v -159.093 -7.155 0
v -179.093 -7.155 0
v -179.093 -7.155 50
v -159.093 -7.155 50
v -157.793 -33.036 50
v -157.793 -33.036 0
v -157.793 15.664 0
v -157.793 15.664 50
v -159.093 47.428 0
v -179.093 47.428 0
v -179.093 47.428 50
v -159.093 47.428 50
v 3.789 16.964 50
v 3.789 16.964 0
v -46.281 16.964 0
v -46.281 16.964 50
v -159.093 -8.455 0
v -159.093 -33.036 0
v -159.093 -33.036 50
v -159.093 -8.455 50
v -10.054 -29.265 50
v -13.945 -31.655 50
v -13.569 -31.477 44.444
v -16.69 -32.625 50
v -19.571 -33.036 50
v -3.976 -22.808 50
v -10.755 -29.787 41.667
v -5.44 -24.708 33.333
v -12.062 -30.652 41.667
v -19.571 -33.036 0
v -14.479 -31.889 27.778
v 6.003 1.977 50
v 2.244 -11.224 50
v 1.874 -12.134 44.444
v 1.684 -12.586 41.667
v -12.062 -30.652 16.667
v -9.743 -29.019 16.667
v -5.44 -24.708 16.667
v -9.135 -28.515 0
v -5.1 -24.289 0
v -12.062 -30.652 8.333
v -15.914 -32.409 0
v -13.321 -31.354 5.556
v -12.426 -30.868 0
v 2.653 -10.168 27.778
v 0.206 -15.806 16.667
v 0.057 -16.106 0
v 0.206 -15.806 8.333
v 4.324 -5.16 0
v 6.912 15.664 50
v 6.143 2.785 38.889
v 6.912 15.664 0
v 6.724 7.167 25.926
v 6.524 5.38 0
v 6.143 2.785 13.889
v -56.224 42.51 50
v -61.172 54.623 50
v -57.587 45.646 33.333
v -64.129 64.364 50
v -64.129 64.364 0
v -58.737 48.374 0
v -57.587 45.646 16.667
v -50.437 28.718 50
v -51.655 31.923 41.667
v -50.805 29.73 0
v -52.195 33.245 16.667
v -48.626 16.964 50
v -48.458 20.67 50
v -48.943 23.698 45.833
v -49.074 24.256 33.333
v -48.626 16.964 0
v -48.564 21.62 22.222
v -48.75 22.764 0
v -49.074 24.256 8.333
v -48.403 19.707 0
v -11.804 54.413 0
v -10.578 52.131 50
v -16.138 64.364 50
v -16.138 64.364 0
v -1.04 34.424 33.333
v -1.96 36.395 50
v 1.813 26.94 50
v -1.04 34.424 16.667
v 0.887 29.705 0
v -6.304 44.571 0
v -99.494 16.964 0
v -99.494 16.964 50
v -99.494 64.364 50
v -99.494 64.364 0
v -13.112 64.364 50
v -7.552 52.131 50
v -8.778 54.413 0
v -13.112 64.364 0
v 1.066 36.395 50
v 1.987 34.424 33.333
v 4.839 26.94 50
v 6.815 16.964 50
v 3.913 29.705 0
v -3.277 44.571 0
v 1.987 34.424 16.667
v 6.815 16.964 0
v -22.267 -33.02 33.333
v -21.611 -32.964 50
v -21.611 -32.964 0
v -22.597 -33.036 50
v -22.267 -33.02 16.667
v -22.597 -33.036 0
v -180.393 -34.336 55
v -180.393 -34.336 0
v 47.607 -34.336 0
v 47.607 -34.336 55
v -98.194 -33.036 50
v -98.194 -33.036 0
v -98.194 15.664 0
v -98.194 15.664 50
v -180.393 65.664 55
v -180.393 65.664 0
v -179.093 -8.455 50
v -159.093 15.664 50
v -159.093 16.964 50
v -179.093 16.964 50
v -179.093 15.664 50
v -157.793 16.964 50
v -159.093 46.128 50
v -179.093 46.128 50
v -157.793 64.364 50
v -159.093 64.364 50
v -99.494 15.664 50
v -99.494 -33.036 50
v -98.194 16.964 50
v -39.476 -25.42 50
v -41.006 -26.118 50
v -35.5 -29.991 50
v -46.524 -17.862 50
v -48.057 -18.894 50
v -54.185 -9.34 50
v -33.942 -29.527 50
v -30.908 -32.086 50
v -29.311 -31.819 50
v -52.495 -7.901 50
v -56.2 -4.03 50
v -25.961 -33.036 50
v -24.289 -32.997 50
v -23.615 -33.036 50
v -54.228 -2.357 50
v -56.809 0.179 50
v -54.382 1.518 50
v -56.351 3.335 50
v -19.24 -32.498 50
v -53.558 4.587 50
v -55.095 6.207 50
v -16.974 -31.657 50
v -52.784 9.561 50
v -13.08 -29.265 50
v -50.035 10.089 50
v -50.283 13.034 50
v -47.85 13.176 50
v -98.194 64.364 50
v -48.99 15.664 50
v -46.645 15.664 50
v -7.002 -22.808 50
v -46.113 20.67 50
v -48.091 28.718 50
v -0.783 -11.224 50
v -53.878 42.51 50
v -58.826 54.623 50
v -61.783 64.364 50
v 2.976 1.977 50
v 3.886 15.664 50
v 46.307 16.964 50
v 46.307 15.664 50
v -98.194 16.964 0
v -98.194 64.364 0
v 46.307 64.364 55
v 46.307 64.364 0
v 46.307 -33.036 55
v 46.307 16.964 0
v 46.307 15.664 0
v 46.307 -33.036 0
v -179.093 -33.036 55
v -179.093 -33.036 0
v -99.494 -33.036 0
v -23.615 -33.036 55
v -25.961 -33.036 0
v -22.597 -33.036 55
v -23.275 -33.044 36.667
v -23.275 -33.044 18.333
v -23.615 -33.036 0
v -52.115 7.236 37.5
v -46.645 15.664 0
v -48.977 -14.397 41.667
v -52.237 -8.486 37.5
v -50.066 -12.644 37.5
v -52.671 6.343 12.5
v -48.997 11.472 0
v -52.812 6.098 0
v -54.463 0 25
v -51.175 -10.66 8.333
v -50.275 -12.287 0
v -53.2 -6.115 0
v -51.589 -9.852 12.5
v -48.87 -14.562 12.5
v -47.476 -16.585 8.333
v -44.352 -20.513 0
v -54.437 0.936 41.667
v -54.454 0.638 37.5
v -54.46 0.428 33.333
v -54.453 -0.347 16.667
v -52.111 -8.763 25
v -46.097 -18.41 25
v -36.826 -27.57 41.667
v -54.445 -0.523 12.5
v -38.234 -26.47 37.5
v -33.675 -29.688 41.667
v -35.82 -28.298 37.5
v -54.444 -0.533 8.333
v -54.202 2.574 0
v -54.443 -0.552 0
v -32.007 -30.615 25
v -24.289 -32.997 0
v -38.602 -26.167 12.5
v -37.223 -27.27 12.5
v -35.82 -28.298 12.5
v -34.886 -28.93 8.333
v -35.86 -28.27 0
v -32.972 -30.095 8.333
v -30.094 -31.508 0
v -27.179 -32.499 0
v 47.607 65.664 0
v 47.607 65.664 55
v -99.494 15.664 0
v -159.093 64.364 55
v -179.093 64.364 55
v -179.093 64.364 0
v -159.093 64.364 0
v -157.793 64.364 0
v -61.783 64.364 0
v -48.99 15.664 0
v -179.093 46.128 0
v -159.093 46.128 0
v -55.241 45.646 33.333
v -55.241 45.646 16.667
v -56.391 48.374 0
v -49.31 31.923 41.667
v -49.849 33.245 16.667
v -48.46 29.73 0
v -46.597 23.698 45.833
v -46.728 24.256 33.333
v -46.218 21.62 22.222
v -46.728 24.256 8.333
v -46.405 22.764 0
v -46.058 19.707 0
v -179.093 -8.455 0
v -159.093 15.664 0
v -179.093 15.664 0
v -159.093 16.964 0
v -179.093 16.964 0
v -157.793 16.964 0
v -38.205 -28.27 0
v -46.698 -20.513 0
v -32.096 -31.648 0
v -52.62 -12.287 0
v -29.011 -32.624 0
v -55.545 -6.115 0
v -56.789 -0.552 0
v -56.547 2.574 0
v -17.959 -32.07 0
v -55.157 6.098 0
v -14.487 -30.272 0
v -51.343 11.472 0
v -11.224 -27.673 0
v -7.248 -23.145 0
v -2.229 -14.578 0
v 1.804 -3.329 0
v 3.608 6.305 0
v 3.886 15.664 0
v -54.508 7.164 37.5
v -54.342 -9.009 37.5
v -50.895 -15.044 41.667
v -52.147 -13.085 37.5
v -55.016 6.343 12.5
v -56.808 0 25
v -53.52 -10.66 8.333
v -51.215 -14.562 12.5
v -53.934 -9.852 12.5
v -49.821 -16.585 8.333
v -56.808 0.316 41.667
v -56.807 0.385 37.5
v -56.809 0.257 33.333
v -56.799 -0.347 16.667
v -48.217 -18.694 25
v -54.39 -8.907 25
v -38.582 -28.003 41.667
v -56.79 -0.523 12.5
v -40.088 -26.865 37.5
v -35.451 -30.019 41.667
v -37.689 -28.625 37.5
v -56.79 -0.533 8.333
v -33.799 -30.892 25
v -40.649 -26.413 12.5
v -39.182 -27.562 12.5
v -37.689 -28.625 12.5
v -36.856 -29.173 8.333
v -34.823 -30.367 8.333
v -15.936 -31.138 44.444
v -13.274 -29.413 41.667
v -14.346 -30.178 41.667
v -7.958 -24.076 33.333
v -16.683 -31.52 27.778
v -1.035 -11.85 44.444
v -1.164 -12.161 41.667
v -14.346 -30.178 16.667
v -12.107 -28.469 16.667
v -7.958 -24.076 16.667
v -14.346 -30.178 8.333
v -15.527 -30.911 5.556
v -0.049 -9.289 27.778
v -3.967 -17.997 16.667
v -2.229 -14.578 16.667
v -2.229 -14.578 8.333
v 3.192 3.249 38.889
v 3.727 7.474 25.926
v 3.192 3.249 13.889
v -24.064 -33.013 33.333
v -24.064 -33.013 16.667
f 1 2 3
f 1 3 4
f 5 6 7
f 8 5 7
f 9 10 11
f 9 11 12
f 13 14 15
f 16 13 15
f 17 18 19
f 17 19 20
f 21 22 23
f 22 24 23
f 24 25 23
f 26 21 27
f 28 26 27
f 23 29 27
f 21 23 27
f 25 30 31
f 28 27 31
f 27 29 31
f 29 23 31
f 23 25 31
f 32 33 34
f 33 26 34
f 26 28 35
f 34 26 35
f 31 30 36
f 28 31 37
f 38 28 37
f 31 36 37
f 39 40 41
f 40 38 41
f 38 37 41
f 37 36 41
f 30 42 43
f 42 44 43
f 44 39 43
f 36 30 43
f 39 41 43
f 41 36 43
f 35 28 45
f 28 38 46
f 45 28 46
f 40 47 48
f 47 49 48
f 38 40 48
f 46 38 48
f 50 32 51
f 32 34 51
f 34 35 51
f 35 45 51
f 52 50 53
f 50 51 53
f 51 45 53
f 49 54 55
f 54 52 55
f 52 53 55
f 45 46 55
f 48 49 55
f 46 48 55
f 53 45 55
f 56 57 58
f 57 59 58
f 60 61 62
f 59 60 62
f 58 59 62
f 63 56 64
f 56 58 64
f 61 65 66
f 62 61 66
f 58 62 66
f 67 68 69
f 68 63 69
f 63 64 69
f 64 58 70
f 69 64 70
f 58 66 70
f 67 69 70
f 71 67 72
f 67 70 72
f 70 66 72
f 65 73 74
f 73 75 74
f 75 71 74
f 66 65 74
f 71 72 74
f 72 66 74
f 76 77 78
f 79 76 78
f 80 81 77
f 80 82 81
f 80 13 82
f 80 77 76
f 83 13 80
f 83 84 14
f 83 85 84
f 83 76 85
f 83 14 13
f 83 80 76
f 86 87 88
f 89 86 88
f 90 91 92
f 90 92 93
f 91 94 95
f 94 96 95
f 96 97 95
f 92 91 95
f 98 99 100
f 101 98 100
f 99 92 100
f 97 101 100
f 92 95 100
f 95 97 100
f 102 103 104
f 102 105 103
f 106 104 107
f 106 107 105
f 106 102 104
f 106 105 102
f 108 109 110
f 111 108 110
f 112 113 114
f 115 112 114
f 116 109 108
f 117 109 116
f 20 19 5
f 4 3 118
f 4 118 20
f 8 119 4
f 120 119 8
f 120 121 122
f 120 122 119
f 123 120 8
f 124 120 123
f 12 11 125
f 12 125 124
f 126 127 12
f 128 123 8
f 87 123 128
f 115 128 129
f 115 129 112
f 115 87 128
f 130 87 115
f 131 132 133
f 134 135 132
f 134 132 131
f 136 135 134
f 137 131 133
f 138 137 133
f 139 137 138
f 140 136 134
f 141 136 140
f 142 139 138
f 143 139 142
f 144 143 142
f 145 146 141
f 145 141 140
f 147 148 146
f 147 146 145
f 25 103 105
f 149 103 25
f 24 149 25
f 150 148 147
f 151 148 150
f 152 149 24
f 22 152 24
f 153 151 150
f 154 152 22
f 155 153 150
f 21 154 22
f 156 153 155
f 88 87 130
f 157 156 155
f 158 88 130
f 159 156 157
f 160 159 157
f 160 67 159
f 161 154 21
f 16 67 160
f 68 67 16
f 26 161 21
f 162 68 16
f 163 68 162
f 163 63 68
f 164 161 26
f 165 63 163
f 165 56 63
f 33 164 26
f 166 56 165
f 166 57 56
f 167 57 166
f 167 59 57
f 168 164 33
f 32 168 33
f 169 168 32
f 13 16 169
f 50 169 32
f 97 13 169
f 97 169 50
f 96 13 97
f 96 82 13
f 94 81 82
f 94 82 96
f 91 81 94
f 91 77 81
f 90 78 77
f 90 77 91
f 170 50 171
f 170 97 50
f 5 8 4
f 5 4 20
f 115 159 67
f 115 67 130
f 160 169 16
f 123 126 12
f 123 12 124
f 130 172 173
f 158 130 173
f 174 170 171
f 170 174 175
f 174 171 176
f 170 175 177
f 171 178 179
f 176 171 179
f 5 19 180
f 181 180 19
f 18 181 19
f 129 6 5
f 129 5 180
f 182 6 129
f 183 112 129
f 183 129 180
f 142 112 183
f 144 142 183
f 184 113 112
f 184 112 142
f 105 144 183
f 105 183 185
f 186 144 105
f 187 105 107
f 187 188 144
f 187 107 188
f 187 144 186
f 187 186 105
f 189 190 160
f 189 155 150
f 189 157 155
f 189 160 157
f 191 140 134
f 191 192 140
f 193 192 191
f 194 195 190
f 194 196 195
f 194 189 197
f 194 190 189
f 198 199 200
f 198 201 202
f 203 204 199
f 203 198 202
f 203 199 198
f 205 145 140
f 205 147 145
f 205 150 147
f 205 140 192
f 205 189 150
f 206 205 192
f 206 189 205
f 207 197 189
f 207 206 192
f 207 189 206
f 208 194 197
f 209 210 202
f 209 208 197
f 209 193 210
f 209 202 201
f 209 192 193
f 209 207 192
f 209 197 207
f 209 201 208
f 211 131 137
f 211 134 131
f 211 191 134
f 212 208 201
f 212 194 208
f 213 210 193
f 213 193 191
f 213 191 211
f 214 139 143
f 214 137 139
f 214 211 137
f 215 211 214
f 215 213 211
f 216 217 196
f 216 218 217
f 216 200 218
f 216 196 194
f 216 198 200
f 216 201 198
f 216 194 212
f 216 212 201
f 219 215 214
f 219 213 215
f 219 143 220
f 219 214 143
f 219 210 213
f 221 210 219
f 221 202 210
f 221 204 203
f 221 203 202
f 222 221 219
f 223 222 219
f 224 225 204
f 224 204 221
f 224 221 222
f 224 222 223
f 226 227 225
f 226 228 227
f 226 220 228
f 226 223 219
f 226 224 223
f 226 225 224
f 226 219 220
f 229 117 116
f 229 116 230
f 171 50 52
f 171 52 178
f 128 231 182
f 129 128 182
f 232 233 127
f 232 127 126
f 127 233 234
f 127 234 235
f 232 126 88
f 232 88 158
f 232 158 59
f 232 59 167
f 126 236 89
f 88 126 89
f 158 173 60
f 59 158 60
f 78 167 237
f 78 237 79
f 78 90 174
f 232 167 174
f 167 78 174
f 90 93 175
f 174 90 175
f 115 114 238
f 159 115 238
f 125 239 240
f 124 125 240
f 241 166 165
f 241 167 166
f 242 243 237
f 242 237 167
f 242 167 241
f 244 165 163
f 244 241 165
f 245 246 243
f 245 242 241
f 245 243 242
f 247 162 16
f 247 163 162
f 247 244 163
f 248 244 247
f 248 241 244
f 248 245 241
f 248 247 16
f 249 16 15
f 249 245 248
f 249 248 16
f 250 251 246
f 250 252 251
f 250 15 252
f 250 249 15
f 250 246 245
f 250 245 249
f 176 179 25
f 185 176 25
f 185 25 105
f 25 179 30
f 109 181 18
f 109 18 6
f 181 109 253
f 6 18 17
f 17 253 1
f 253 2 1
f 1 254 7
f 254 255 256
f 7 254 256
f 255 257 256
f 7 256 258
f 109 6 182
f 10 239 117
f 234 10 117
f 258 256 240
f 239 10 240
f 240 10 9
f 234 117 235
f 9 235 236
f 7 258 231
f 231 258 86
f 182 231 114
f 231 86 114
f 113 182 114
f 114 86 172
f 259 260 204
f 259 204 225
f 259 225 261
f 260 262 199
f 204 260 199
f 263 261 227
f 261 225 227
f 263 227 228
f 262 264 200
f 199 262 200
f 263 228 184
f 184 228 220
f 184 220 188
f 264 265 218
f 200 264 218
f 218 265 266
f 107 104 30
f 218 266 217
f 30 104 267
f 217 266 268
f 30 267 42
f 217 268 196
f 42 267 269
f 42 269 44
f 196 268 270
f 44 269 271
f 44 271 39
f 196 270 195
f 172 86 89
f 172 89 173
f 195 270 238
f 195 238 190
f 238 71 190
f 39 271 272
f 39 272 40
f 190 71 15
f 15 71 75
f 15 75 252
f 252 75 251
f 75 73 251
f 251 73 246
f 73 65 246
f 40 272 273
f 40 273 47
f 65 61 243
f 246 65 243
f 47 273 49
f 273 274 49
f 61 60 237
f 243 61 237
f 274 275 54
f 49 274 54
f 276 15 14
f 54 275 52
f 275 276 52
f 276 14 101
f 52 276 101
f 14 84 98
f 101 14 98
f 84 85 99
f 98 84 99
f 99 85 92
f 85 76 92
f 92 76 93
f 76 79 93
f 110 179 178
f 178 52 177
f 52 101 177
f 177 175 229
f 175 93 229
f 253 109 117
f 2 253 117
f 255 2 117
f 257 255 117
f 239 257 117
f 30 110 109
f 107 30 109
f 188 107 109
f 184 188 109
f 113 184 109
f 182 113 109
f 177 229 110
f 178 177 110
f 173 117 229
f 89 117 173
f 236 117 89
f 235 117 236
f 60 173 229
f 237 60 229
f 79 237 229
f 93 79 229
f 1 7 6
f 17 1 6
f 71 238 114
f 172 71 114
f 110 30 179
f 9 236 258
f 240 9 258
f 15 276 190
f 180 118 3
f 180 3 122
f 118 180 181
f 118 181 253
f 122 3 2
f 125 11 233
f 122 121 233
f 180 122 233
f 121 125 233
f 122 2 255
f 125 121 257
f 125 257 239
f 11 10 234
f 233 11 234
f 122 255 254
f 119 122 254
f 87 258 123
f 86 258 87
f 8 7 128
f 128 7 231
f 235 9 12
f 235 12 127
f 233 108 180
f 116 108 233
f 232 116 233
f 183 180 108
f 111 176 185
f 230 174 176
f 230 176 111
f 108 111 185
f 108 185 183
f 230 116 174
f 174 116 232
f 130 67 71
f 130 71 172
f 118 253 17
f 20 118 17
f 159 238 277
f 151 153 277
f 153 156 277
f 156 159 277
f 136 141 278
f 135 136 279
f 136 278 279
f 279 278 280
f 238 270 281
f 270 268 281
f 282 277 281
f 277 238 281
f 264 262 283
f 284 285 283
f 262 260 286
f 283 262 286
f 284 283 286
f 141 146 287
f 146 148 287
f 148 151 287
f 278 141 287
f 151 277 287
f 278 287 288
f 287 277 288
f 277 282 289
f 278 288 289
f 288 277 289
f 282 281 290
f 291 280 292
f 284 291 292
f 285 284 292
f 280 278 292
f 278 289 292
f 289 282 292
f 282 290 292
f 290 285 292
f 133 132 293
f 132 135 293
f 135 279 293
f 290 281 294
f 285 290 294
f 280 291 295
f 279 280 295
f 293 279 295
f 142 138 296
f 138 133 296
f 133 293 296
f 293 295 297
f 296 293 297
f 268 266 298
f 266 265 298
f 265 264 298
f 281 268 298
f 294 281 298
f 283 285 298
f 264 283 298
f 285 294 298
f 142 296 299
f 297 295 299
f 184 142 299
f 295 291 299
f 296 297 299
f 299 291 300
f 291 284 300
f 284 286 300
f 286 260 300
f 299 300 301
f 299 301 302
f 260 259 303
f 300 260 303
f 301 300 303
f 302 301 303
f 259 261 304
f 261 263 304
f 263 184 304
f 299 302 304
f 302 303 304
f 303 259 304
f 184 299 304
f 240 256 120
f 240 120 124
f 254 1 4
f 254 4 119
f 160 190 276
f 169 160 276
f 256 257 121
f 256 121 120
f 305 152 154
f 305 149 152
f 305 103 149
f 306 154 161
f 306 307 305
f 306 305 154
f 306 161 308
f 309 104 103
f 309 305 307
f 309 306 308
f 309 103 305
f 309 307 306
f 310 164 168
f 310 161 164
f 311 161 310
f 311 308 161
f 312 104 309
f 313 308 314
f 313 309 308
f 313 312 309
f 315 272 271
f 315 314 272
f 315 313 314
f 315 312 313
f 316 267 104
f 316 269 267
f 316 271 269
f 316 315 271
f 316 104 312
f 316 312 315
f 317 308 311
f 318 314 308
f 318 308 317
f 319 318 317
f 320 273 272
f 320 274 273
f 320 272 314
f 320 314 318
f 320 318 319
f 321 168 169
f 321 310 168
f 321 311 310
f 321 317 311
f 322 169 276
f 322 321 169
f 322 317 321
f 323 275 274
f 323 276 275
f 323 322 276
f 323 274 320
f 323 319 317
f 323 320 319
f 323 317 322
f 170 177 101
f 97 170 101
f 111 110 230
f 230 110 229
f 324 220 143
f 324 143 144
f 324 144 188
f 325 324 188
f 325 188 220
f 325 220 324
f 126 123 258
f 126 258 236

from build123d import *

# Parameters (mm, degrees)
F0_W     = 228
F0_H     = 100
F0_W_2   = 20
F0_H_2   = 24.5810076863
F0_H_3   = 22.8189926594
F0_H_4   = 29.1644897312
F0_W_3   = 58.2984770788
F0_H_5   = 47.4000003457
F0_H_6   = 16.9355106145
F1_DEPTH = 55
F2_W     = 225.4000006914
F2_H     = 97.4000006914
F3_DEPTH = 5


with BuildPart() as f1:
    # F0 (on Top) → F1 (new body)
    with BuildSketch(Plane.XY):
        with Locations((-66.3927308619, 15.6637772918)):
            Rectangle(F0_W, F0_H)
        with Locations((-169.0927312076, -20.7457192108)):
            Rectangle(F0_W_2, F0_H_2, mode=Mode.SUBTRACT)
        Polygon((-99.494241178, -33.0362230539), (-157.7927312076, -33.0362230539), (-157.7927312076, 15.6637772918), (-99.4942541288, 15.6637772918), align=None, mode=Mode.SUBTRACT)
        with Locations((-169.0927312076, 4.254280962)):
            Rectangle(F0_W_2, F0_H_3, mode=Mode.SUBTRACT)
        with BuildLine():
            add(Edge.make_bspline(
                [(-48.9903728661, 15.6637772918), (-50.8894876917, 10.2674604802), (-66.765290357, 1.4664925702), (-40.0663002403, -32.5316685311), (-25.9607383293, -33.0362230539)],
                knots=[0.2243177363, 0.2243177363, 0.2243177363, 0.2243177363, 0.3467822733, 0.5479791111, 0.5479791111, 0.5479791111, 0.5479791111], degree=3))
            Line((-25.9607383293, -33.0362230539), (-98.194241178, -33.0362230539))
            Line((-98.194241178, -33.0362230539), (-98.1942541288, 15.6637772918))
            Line((-98.1942541288, 15.6637772918), (-48.9903728661, 15.6637772918))
        make_face(mode=Mode.SUBTRACT)
        with BuildLine():
            add(Edge.make_bspline(
                [(-21.6105978481, -32.9644661853), (-6.3706766603, -31.3032384951), (5.0973679535, -4.3926706889), (3.8858228363, 15.6637772918)],
                knots=[0.5576009666, 0.5576009666, 0.5576009666, 0.5576009666, 0.7792958229, 0.7792958229, 0.7792958229, 0.7792958229], degree=3))
            add(Edge.make_bspline(
                [(-22.597104311, -33.0362230539), (-22.2665896559, -33.0241494524), (-21.9377248021, -33.0001246607), (-21.6105978481, -32.9644661853)],
                knots=[0.5528422567, 0.5528422567, 0.5528422567, 0.5528422567, 0.5576009666, 0.5576009666, 0.5576009666, 0.5576009666], degree=3))
            add(Edge.make_bspline(
                [(-23.6153104586, -33.0362230539), (-23.2743637388, -33.0484186836), (-22.9348725199, -33.0485616256), (-22.597104311, -33.0362230539)],
                knots=[0.5479791111, 0.5479791111, 0.5479791111, 0.5479791111, 0.5528422567, 0.5528422567, 0.5528422567, 0.5528422567], degree=3))
            add(Edge.make_bspline(
                [(-24.2891701926, -32.9966958469), (-24.0639725183, -33.0149937125), (-23.839327314, -33.0282099937), (-23.6153104586, -33.0362230539)],
                knots=[0.5447838124, 0.5447838124, 0.5447838124, 0.5447838124, 0.5479791111, 0.5479791111, 0.5479791111, 0.5479791111], degree=3))
            add(Edge.make_bspline(
                [(-46.6449449953, 15.6637772918), (-48.5440598209, 10.2674604802), (-64.2631309923, 1.5533788133), (-38.243886485, -31.8628407834), (-24.2891701926, -32.9966958469)],
                knots=[0.2243177363, 0.2243177363, 0.2243177363, 0.2243177363, 0.3467822733, 0.5447838124, 0.5447838124, 0.5447838124, 0.5447838124], degree=3))
            add(Edge.make_bspline(
                [(-46.2810248137, 16.9637772918), (-46.3742506197, 16.5161489966), (-46.4971600312, 16.0837068693), (-46.6449449953, 15.6637772918)],
                knots=[0.2147878138, 0.2147878138, 0.2147878138, 0.2147878138, 0.2243177363, 0.2243177363, 0.2243177363, 0.2243177363], degree=3))
            add(Edge.make_bspline(
                [(-61.7832280695, 64.3637776375), (-57.1571978586, 44.8554591392), (-44.1798779302, 27.0525374476), (-46.2810248137, 16.9637772918)],
                knots=[0, 0, 0, 0, 0.2147878138, 0.2147878138, 0.2147878138, 0.2147878138], degree=3))
            Line((-61.7832280695, 64.3637776375), (-58.7569419295, 64.3637776375))
            Line((-58.7569419295, 64.3637776375), (-18.4832829982, 64.3637776375))
            Line((-18.4832829982, 64.3637776375), (-16.1378551275, 64.3637776375))
            add(Edge.make_bspline(
                [(3.7889127405, 16.9637772918), (2.0816215591, 36.2077970929), (-11.2032608143, 49.1446081038), (-16.1378551275, 64.3637776375)],
                knots=[0.7841212321, 0.7841212321, 0.7841212321, 0.7841212321, 1, 1, 1, 1], degree=3))
            add(Edge.make_bspline(
                [(3.8858228363, 15.6637772918), (3.8594523508, 16.1003258471), (3.8270748012, 16.5336272046), (3.7889127405, 16.9637772918)],
                knots=[0.7792958229, 0.7792958229, 0.7792958229, 0.7792958229, 0.7841212321, 0.7841212321, 0.7841212321, 0.7841212321], degree=3))
        make_face(mode=Mode.SUBTRACT)
        with BuildLine():
            add(Edge.make_bspline(
                [(-19.5708181709, -33.0362230539), (-3.8425589006, -32.4616744452), (8.1496600722, -4.8231850372), (6.9121089764, 15.6637772918)],
                knots=[0.5528422567, 0.5528422567, 0.5528422567, 0.5528422567, 0.7792958229, 0.7792958229, 0.7792958229, 0.7792958229], degree=3))
            Line((6.9121089764, 15.6637772918), (46.3072694838, 15.6637772918))
            Line((46.3072694838, 15.6637772918), (46.3072694838, -33.0362230539))
            Line((46.3072694838, -33.0362230539), (-19.5708181709, -33.0362230539))
        make_face(mode=Mode.SUBTRACT)
        with Locations((-169.0927312076, 31.5460221574)):
            Rectangle(F0_W_2, F0_H_4, mode=Mode.SUBTRACT)
        with Locations((-128.6434926682, 40.6637774646)):
            Rectangle(F0_W_3, F0_H_5, mode=Mode.SUBTRACT)
        with Locations((-169.0927312076, 55.8960223302)):
            Rectangle(F0_W_2, F0_H_6, mode=Mode.SUBTRACT)
        with BuildLine():
            add(Edge.make_bspline(
                [(-64.1286559403, 64.3637776375), (-59.5026257294, 44.8554591392), (-46.525305801, 27.0525374476), (-48.6264526844, 16.9637772918)],
                knots=[0, 0, 0, 0, 0.2147878138, 0.2147878138, 0.2147878138, 0.2147878138], degree=3))
            Line((-48.6264526844, 16.9637772918), (-98.1942541288, 16.9637772918))
            Line((-98.1942541288, 16.9637772918), (-98.1942541288, 64.3637776375))
            Line((-98.1942541288, 64.3637776375), (-64.1286559403, 64.3637776375))
        make_face(mode=Mode.SUBTRACT)
        with BuildLine():
            Line((-13.1115689874, 64.3637776375), (46.3072694838, 64.3637776375))
            Line((46.3072694838, 64.3637776375), (46.3072694838, 16.9637772918))
            Line((46.3072694838, 16.9637772918), (6.8151988806, 16.9637772918))
            add(Edge.make_bspline(
                [(6.8151988806, 16.9637772918), (5.1079076992, 36.2077970929), (-8.1769746743, 49.1446081038), (-13.1115689874, 64.3637776375)],
                knots=[0.7841212321, 0.7841212321, 0.7841212321, 0.7841212321, 1, 1, 1, 1], degree=3))
        make_face(mode=Mode.SUBTRACT)
        with BuildLine():
            Line((1.5403949656, 15.6637772918), (3.8858228363, 15.6637772918))
            add(Edge.make_bspline(
                [(3.8858228363, 15.6637772918), (3.8594523508, 16.1003258471), (3.8270748012, 16.5336272046), (3.7889127405, 16.9637772918)],
                knots=[0.7792958229, 0.7792958229, 0.7792958229, 0.7792958229, 0.7841212321, 0.7841212321, 0.7841212321, 0.7841212321], degree=3))
            Line((3.7889127405, 16.9637772918), (1.4434848698, 16.9637772918))
            add(Edge.make_bspline(
                [(1.5403949656, 15.6637772918), (1.5140244801, 16.1003258471), (1.4816469304, 16.5336272046), (1.4434848698, 16.9637772918)],
                knots=[0.7792958229, 0.7792958229, 0.7792958229, 0.7792958229, 0.7841212321, 0.7841212321, 0.7841212321, 0.7841212321], degree=3))
        make_face()
        with BuildLine():
            Line((-43.6186588553, 15.6637772918), (1.5403949656, 15.6637772918))
            add(Edge.make_bspline(
                [(1.5403949656, 15.6637772918), (1.5140244801, 16.1003258471), (1.4816469304, 16.5336272046), (1.4434848698, 16.9637772918)],
                knots=[0.7792958229, 0.7792958229, 0.7792958229, 0.7792958229, 0.7841212321, 0.7841212321, 0.7841212321, 0.7841212321], degree=3))
            Line((1.4434848698, 16.9637772918), (-43.2547386736, 16.9637772918))
            add(Edge.make_bspline(
                [(-43.2547386736, 16.9637772918), (-43.3479644796, 16.5161489966), (-43.4708738911, 16.0837068693), (-43.6186588553, 15.6637772918)],
                knots=[0.2147878138, 0.2147878138, 0.2147878138, 0.2147878138, 0.2243177363, 0.2243177363, 0.2243177363, 0.2243177363], degree=3))
        make_face()
        with BuildLine():
            Line((-46.6449449953, 15.6637772918), (-43.6186588553, 15.6637772918))
            add(Edge.make_bspline(
                [(-43.2547386736, 16.9637772918), (-43.3479644796, 16.5161489966), (-43.4708738911, 16.0837068693), (-43.6186588553, 15.6637772918)],
                knots=[0.2147878138, 0.2147878138, 0.2147878138, 0.2147878138, 0.2243177363, 0.2243177363, 0.2243177363, 0.2243177363], degree=3))
            Line((-43.2547386736, 16.9637772918), (-46.2810248137, 16.9637772918))
            add(Edge.make_bspline(
                [(-46.2810248137, 16.9637772918), (-46.3742506197, 16.5161489966), (-46.4971600312, 16.0837068693), (-46.6449449953, 15.6637772918)],
                knots=[0.2147878138, 0.2147878138, 0.2147878138, 0.2147878138, 0.2243177363, 0.2243177363, 0.2243177363, 0.2243177363], degree=3))
        make_face()
    extrude(amount=F1_DEPTH)

    # F2 (on face) → F3 (cut)
    with BuildSketch(Plane.XY.offset(55)):
        with Locations((-66.3927308619, 15.6637772918)):
            Rectangle(F2_W, F2_H)
    extrude(amount=-F3_DEPTH, mode=Mode.SUBTRACT)


solid = f1.part
